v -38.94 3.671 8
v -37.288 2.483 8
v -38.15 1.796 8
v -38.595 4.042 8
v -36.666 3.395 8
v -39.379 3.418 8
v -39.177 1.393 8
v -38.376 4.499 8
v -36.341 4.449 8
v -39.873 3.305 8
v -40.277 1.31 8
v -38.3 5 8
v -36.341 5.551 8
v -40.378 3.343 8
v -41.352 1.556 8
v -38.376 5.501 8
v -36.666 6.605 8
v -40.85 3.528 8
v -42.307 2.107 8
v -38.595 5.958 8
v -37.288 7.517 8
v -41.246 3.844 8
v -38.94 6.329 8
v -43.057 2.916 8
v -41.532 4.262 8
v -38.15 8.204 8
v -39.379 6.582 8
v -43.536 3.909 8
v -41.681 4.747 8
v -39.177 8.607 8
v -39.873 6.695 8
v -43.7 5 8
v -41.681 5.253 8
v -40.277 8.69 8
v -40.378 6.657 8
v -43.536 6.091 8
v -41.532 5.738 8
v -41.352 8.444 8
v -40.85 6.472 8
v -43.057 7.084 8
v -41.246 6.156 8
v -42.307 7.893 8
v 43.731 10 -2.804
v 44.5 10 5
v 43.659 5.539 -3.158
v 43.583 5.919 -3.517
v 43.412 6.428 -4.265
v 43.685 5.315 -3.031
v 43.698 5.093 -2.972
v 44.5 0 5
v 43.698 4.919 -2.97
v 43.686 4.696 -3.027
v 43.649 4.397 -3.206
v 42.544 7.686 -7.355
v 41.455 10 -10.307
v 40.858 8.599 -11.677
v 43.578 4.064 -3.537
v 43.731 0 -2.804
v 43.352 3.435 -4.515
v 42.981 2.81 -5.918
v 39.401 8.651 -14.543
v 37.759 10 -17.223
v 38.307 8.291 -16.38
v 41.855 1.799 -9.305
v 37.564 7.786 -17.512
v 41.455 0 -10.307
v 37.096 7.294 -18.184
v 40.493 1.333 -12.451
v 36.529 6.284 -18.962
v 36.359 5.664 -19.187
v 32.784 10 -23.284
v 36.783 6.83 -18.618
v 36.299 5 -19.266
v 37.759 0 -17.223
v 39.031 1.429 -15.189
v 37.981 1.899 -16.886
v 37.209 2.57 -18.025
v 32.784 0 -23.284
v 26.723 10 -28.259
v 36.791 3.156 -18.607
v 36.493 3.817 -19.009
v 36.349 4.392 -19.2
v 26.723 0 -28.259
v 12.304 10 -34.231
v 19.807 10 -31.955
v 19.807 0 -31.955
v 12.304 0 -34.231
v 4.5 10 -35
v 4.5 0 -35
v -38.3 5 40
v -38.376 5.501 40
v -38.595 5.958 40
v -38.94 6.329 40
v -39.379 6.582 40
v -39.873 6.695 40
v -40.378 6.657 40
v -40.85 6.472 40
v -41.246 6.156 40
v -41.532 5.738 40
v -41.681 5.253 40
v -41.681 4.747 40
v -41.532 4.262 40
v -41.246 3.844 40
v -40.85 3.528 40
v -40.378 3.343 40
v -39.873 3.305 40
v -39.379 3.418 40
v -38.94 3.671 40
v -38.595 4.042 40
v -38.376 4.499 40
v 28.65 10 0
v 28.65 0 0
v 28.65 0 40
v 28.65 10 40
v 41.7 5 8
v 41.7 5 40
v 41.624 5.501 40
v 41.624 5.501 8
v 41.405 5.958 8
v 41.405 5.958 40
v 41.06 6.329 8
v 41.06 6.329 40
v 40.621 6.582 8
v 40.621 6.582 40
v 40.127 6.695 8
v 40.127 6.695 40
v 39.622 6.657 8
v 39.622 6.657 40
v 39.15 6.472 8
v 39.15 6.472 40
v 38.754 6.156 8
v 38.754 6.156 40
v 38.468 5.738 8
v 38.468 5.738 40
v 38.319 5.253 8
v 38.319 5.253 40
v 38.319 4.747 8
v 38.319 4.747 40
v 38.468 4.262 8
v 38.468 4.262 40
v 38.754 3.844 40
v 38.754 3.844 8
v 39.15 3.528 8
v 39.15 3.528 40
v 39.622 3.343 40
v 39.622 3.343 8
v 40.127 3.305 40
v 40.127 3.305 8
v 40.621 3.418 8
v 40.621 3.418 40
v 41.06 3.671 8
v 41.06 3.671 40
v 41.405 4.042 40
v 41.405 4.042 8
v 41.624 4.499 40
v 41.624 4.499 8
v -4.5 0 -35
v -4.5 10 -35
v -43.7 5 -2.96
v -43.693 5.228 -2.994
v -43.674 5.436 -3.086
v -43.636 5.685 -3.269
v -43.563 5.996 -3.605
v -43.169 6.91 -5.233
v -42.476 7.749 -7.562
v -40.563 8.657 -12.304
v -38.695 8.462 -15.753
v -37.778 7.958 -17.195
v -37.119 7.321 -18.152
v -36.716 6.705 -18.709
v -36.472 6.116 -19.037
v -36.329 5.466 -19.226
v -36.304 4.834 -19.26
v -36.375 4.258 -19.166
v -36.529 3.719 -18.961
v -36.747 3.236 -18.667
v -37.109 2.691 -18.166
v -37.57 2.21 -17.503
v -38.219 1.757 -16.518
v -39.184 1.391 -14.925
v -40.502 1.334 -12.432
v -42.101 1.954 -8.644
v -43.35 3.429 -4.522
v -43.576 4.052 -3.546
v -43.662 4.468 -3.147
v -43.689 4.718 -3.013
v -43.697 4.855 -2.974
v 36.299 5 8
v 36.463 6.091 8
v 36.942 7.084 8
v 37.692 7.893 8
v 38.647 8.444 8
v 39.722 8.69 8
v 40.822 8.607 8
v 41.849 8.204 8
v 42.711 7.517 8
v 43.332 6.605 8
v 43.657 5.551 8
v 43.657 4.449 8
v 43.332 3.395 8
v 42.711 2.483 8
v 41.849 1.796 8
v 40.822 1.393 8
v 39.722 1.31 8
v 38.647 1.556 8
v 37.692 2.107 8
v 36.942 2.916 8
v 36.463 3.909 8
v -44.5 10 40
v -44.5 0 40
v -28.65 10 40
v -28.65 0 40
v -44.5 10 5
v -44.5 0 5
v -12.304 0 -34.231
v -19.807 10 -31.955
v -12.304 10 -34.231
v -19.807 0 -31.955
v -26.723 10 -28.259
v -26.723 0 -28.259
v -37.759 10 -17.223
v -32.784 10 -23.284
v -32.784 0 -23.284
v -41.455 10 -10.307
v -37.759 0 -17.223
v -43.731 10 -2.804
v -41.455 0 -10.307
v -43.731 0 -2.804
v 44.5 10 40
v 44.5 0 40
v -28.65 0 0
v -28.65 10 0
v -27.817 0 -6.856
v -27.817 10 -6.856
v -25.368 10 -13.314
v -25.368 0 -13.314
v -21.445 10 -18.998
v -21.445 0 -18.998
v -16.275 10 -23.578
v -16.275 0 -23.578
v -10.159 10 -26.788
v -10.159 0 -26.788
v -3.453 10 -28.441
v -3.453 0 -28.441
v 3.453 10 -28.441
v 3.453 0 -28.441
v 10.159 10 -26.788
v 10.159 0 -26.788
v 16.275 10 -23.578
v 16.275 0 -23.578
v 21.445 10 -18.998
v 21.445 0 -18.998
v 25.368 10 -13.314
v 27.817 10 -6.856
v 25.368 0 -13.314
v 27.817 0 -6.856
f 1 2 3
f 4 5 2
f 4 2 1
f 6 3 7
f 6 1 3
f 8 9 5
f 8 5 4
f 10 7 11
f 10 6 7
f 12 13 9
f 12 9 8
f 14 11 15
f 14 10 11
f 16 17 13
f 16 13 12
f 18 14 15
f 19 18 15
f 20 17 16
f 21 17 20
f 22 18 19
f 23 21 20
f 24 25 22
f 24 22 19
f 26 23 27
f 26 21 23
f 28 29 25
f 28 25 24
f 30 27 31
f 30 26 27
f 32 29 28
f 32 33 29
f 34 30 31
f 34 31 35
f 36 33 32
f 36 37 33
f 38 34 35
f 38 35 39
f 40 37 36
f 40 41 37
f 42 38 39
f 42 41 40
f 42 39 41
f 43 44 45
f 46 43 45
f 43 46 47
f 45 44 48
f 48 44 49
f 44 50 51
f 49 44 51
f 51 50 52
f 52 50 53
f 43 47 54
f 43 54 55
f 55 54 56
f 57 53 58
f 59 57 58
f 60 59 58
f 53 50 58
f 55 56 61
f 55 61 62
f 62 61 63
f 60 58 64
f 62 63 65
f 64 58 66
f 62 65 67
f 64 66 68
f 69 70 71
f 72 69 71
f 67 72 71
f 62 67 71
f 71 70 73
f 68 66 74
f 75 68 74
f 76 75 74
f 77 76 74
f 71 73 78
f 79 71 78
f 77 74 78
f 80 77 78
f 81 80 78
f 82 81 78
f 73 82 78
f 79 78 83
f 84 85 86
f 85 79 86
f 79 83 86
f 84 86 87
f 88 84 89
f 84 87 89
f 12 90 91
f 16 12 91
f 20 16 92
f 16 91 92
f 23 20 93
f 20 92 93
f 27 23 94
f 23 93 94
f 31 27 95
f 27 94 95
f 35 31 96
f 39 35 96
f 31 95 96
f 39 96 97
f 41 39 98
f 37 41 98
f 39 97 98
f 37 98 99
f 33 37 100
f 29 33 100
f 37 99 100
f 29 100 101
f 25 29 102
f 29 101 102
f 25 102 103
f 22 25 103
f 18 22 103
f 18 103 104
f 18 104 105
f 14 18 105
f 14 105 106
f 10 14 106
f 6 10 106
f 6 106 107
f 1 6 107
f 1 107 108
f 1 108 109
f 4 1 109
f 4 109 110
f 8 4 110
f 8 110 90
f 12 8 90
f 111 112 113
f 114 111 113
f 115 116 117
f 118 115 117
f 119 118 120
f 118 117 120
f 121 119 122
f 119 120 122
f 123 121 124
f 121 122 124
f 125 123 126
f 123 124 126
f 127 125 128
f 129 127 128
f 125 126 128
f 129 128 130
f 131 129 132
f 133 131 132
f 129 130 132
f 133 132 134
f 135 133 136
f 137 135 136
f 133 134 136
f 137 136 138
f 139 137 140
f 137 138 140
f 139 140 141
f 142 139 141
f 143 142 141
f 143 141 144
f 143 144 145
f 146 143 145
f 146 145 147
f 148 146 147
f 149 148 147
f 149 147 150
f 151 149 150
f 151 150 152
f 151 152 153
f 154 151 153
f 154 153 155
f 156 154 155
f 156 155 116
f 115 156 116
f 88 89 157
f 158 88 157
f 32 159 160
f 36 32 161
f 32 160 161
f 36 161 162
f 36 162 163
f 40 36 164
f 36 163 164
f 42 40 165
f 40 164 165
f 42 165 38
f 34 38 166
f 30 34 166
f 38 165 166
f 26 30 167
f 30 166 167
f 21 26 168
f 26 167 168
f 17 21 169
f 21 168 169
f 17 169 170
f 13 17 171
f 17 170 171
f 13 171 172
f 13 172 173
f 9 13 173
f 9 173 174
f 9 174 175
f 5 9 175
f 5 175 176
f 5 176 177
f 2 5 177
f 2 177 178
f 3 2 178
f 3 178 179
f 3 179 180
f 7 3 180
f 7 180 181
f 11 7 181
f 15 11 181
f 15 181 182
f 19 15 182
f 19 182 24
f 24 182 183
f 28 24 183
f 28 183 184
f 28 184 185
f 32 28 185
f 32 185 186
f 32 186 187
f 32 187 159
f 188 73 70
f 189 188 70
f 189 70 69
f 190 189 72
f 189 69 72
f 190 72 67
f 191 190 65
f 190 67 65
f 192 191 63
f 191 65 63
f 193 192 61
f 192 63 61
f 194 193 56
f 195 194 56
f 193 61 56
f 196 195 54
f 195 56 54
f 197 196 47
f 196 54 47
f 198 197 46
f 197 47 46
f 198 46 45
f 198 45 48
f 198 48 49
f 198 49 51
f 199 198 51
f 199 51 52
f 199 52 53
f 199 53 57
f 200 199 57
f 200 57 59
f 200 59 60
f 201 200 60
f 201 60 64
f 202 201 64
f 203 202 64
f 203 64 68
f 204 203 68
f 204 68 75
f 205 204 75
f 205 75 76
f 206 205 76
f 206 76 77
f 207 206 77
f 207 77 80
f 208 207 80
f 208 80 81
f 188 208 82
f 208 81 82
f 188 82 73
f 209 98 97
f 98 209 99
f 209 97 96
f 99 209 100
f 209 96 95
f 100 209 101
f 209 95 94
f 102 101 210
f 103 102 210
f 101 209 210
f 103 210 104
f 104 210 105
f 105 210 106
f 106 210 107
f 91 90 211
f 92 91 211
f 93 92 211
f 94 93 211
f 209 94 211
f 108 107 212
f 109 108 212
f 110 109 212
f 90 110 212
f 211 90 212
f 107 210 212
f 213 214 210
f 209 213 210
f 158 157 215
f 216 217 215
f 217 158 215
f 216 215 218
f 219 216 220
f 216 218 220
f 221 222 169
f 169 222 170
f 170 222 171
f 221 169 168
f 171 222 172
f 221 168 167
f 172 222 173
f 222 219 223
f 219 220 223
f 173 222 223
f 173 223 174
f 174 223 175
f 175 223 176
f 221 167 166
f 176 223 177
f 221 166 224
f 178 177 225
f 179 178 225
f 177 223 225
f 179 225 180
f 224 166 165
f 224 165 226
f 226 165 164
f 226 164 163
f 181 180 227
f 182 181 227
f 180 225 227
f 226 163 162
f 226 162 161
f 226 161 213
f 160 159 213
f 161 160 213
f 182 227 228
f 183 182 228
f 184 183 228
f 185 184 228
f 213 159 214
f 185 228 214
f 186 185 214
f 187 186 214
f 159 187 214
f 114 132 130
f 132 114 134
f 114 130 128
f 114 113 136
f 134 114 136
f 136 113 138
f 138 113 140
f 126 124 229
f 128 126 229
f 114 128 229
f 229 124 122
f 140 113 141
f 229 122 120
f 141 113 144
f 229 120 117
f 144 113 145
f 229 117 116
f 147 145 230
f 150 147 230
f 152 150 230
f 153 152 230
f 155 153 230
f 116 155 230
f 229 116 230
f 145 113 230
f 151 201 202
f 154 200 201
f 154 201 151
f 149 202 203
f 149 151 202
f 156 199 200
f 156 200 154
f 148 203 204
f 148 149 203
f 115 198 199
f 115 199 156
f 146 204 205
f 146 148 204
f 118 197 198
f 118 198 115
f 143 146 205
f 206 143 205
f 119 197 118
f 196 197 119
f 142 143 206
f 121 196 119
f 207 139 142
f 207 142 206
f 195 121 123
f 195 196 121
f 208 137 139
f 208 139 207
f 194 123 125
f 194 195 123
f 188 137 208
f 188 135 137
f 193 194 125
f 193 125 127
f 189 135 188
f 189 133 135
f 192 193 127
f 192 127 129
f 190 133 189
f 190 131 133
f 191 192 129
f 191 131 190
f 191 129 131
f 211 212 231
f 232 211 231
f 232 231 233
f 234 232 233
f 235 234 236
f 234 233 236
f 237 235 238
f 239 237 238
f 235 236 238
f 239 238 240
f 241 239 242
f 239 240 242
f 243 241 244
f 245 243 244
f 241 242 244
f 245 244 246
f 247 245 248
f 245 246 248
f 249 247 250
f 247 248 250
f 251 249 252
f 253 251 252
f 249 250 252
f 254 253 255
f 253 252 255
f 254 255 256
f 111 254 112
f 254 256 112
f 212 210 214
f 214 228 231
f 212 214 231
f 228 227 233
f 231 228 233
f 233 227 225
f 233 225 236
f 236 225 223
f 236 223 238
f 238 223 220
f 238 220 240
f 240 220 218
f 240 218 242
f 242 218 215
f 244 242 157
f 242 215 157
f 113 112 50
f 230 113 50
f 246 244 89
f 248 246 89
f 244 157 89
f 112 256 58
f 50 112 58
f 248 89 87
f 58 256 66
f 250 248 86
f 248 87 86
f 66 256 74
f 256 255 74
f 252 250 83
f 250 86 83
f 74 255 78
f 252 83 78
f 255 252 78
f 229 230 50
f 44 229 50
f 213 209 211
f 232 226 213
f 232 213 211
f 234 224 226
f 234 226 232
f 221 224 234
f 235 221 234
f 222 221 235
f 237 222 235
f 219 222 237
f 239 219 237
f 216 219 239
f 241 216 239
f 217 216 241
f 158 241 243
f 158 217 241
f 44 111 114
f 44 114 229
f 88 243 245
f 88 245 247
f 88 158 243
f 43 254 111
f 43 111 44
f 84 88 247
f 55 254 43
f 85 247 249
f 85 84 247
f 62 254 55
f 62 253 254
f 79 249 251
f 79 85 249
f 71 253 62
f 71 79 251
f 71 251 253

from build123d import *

# Parameters (mm, degrees)
EXTRUDE_1_DEPTH     = 10
SKETCH_2_R          = 1.7
CUT_EXTRUDE_1_DEPTH = 90
SKETCH_3_R          = 3.7
CUT_EXTRUDE_2_DEPTH = 43
FILLET_1_R          = 40


with BuildPart() as part:
    # 草图1 → 凸台-拉伸1 (new body)
    with BuildSketch(Plane(origin=(0, 0, 0), x_dir=(1, 0, 0), z_dir=(0, 1, 0))):
        with BuildLine():
            Line((28.65, -40), (44.5, -40))
            Line((44.5, -40), (44.5, 35))
            Line((44.5, 35), (-44.5, 35))
            Line((-44.5, 35), (-44.5, -40))
            Line((-44.5, -40), (-28.65, -40))
            Line((-28.65, -40), (-28.65, 0))
            ThreePointArc((-28.65, 0), (0, 28.65), (28.65, 0))
            Line((28.65, 0), (28.65, -40))
        make_face()
    extrude(amount=EXTRUDE_1_DEPTH)

    # 草图2 → 切除-拉伸1 (cut)
    with BuildSketch(Plane.XY.offset(40)):
        with Locations((-40, 5)):
            Circle(SKETCH_2_R)
        with Locations((40, 5)):
            Circle(SKETCH_2_R)
    extrude(amount=-CUT_EXTRUDE_1_DEPTH, mode=Mode.SUBTRACT)

    # 草图3 → 切除-拉伸2 (cut)
    with BuildSketch(Plane(origin=(0, 0, -35), x_dir=(-1, 0, 0), z_dir=(0, 0, -1))):
        with Locations((40, 5)):
            Circle(SKETCH_3_R)
        with Locations((-39.998802569, 5)):
            Circle(SKETCH_3_R)
    extrude(amount=-CUT_EXTRUDE_2_DEPTH, mode=Mode.SUBTRACT)

    # 圆角1
    # the kernel refuses this fillet: 40 mm, written as the material it takes off along each edge
    with BuildSketch(Plane(origin=(-44.5, -100, -35), x_dir=(1, 0, 0), z_dir=(0, 1, 0)), Plane(origin=(44.5, -100, -35), x_dir=(0, 0, 1), z_dir=(0, 1, 0))) as fillet_1_piece_1:
        with BuildLine():
            CenterArc((FILLET_1_R, -FILLET_1_R), FILLET_1_R, 90, 90)
            Line((0, -FILLET_1_R), (0, 0))
            Line((0, 0), (FILLET_1_R, 0))
        make_face()
    extrude(amount=210, mode=Mode.SUBTRACT)


solid = part.part
